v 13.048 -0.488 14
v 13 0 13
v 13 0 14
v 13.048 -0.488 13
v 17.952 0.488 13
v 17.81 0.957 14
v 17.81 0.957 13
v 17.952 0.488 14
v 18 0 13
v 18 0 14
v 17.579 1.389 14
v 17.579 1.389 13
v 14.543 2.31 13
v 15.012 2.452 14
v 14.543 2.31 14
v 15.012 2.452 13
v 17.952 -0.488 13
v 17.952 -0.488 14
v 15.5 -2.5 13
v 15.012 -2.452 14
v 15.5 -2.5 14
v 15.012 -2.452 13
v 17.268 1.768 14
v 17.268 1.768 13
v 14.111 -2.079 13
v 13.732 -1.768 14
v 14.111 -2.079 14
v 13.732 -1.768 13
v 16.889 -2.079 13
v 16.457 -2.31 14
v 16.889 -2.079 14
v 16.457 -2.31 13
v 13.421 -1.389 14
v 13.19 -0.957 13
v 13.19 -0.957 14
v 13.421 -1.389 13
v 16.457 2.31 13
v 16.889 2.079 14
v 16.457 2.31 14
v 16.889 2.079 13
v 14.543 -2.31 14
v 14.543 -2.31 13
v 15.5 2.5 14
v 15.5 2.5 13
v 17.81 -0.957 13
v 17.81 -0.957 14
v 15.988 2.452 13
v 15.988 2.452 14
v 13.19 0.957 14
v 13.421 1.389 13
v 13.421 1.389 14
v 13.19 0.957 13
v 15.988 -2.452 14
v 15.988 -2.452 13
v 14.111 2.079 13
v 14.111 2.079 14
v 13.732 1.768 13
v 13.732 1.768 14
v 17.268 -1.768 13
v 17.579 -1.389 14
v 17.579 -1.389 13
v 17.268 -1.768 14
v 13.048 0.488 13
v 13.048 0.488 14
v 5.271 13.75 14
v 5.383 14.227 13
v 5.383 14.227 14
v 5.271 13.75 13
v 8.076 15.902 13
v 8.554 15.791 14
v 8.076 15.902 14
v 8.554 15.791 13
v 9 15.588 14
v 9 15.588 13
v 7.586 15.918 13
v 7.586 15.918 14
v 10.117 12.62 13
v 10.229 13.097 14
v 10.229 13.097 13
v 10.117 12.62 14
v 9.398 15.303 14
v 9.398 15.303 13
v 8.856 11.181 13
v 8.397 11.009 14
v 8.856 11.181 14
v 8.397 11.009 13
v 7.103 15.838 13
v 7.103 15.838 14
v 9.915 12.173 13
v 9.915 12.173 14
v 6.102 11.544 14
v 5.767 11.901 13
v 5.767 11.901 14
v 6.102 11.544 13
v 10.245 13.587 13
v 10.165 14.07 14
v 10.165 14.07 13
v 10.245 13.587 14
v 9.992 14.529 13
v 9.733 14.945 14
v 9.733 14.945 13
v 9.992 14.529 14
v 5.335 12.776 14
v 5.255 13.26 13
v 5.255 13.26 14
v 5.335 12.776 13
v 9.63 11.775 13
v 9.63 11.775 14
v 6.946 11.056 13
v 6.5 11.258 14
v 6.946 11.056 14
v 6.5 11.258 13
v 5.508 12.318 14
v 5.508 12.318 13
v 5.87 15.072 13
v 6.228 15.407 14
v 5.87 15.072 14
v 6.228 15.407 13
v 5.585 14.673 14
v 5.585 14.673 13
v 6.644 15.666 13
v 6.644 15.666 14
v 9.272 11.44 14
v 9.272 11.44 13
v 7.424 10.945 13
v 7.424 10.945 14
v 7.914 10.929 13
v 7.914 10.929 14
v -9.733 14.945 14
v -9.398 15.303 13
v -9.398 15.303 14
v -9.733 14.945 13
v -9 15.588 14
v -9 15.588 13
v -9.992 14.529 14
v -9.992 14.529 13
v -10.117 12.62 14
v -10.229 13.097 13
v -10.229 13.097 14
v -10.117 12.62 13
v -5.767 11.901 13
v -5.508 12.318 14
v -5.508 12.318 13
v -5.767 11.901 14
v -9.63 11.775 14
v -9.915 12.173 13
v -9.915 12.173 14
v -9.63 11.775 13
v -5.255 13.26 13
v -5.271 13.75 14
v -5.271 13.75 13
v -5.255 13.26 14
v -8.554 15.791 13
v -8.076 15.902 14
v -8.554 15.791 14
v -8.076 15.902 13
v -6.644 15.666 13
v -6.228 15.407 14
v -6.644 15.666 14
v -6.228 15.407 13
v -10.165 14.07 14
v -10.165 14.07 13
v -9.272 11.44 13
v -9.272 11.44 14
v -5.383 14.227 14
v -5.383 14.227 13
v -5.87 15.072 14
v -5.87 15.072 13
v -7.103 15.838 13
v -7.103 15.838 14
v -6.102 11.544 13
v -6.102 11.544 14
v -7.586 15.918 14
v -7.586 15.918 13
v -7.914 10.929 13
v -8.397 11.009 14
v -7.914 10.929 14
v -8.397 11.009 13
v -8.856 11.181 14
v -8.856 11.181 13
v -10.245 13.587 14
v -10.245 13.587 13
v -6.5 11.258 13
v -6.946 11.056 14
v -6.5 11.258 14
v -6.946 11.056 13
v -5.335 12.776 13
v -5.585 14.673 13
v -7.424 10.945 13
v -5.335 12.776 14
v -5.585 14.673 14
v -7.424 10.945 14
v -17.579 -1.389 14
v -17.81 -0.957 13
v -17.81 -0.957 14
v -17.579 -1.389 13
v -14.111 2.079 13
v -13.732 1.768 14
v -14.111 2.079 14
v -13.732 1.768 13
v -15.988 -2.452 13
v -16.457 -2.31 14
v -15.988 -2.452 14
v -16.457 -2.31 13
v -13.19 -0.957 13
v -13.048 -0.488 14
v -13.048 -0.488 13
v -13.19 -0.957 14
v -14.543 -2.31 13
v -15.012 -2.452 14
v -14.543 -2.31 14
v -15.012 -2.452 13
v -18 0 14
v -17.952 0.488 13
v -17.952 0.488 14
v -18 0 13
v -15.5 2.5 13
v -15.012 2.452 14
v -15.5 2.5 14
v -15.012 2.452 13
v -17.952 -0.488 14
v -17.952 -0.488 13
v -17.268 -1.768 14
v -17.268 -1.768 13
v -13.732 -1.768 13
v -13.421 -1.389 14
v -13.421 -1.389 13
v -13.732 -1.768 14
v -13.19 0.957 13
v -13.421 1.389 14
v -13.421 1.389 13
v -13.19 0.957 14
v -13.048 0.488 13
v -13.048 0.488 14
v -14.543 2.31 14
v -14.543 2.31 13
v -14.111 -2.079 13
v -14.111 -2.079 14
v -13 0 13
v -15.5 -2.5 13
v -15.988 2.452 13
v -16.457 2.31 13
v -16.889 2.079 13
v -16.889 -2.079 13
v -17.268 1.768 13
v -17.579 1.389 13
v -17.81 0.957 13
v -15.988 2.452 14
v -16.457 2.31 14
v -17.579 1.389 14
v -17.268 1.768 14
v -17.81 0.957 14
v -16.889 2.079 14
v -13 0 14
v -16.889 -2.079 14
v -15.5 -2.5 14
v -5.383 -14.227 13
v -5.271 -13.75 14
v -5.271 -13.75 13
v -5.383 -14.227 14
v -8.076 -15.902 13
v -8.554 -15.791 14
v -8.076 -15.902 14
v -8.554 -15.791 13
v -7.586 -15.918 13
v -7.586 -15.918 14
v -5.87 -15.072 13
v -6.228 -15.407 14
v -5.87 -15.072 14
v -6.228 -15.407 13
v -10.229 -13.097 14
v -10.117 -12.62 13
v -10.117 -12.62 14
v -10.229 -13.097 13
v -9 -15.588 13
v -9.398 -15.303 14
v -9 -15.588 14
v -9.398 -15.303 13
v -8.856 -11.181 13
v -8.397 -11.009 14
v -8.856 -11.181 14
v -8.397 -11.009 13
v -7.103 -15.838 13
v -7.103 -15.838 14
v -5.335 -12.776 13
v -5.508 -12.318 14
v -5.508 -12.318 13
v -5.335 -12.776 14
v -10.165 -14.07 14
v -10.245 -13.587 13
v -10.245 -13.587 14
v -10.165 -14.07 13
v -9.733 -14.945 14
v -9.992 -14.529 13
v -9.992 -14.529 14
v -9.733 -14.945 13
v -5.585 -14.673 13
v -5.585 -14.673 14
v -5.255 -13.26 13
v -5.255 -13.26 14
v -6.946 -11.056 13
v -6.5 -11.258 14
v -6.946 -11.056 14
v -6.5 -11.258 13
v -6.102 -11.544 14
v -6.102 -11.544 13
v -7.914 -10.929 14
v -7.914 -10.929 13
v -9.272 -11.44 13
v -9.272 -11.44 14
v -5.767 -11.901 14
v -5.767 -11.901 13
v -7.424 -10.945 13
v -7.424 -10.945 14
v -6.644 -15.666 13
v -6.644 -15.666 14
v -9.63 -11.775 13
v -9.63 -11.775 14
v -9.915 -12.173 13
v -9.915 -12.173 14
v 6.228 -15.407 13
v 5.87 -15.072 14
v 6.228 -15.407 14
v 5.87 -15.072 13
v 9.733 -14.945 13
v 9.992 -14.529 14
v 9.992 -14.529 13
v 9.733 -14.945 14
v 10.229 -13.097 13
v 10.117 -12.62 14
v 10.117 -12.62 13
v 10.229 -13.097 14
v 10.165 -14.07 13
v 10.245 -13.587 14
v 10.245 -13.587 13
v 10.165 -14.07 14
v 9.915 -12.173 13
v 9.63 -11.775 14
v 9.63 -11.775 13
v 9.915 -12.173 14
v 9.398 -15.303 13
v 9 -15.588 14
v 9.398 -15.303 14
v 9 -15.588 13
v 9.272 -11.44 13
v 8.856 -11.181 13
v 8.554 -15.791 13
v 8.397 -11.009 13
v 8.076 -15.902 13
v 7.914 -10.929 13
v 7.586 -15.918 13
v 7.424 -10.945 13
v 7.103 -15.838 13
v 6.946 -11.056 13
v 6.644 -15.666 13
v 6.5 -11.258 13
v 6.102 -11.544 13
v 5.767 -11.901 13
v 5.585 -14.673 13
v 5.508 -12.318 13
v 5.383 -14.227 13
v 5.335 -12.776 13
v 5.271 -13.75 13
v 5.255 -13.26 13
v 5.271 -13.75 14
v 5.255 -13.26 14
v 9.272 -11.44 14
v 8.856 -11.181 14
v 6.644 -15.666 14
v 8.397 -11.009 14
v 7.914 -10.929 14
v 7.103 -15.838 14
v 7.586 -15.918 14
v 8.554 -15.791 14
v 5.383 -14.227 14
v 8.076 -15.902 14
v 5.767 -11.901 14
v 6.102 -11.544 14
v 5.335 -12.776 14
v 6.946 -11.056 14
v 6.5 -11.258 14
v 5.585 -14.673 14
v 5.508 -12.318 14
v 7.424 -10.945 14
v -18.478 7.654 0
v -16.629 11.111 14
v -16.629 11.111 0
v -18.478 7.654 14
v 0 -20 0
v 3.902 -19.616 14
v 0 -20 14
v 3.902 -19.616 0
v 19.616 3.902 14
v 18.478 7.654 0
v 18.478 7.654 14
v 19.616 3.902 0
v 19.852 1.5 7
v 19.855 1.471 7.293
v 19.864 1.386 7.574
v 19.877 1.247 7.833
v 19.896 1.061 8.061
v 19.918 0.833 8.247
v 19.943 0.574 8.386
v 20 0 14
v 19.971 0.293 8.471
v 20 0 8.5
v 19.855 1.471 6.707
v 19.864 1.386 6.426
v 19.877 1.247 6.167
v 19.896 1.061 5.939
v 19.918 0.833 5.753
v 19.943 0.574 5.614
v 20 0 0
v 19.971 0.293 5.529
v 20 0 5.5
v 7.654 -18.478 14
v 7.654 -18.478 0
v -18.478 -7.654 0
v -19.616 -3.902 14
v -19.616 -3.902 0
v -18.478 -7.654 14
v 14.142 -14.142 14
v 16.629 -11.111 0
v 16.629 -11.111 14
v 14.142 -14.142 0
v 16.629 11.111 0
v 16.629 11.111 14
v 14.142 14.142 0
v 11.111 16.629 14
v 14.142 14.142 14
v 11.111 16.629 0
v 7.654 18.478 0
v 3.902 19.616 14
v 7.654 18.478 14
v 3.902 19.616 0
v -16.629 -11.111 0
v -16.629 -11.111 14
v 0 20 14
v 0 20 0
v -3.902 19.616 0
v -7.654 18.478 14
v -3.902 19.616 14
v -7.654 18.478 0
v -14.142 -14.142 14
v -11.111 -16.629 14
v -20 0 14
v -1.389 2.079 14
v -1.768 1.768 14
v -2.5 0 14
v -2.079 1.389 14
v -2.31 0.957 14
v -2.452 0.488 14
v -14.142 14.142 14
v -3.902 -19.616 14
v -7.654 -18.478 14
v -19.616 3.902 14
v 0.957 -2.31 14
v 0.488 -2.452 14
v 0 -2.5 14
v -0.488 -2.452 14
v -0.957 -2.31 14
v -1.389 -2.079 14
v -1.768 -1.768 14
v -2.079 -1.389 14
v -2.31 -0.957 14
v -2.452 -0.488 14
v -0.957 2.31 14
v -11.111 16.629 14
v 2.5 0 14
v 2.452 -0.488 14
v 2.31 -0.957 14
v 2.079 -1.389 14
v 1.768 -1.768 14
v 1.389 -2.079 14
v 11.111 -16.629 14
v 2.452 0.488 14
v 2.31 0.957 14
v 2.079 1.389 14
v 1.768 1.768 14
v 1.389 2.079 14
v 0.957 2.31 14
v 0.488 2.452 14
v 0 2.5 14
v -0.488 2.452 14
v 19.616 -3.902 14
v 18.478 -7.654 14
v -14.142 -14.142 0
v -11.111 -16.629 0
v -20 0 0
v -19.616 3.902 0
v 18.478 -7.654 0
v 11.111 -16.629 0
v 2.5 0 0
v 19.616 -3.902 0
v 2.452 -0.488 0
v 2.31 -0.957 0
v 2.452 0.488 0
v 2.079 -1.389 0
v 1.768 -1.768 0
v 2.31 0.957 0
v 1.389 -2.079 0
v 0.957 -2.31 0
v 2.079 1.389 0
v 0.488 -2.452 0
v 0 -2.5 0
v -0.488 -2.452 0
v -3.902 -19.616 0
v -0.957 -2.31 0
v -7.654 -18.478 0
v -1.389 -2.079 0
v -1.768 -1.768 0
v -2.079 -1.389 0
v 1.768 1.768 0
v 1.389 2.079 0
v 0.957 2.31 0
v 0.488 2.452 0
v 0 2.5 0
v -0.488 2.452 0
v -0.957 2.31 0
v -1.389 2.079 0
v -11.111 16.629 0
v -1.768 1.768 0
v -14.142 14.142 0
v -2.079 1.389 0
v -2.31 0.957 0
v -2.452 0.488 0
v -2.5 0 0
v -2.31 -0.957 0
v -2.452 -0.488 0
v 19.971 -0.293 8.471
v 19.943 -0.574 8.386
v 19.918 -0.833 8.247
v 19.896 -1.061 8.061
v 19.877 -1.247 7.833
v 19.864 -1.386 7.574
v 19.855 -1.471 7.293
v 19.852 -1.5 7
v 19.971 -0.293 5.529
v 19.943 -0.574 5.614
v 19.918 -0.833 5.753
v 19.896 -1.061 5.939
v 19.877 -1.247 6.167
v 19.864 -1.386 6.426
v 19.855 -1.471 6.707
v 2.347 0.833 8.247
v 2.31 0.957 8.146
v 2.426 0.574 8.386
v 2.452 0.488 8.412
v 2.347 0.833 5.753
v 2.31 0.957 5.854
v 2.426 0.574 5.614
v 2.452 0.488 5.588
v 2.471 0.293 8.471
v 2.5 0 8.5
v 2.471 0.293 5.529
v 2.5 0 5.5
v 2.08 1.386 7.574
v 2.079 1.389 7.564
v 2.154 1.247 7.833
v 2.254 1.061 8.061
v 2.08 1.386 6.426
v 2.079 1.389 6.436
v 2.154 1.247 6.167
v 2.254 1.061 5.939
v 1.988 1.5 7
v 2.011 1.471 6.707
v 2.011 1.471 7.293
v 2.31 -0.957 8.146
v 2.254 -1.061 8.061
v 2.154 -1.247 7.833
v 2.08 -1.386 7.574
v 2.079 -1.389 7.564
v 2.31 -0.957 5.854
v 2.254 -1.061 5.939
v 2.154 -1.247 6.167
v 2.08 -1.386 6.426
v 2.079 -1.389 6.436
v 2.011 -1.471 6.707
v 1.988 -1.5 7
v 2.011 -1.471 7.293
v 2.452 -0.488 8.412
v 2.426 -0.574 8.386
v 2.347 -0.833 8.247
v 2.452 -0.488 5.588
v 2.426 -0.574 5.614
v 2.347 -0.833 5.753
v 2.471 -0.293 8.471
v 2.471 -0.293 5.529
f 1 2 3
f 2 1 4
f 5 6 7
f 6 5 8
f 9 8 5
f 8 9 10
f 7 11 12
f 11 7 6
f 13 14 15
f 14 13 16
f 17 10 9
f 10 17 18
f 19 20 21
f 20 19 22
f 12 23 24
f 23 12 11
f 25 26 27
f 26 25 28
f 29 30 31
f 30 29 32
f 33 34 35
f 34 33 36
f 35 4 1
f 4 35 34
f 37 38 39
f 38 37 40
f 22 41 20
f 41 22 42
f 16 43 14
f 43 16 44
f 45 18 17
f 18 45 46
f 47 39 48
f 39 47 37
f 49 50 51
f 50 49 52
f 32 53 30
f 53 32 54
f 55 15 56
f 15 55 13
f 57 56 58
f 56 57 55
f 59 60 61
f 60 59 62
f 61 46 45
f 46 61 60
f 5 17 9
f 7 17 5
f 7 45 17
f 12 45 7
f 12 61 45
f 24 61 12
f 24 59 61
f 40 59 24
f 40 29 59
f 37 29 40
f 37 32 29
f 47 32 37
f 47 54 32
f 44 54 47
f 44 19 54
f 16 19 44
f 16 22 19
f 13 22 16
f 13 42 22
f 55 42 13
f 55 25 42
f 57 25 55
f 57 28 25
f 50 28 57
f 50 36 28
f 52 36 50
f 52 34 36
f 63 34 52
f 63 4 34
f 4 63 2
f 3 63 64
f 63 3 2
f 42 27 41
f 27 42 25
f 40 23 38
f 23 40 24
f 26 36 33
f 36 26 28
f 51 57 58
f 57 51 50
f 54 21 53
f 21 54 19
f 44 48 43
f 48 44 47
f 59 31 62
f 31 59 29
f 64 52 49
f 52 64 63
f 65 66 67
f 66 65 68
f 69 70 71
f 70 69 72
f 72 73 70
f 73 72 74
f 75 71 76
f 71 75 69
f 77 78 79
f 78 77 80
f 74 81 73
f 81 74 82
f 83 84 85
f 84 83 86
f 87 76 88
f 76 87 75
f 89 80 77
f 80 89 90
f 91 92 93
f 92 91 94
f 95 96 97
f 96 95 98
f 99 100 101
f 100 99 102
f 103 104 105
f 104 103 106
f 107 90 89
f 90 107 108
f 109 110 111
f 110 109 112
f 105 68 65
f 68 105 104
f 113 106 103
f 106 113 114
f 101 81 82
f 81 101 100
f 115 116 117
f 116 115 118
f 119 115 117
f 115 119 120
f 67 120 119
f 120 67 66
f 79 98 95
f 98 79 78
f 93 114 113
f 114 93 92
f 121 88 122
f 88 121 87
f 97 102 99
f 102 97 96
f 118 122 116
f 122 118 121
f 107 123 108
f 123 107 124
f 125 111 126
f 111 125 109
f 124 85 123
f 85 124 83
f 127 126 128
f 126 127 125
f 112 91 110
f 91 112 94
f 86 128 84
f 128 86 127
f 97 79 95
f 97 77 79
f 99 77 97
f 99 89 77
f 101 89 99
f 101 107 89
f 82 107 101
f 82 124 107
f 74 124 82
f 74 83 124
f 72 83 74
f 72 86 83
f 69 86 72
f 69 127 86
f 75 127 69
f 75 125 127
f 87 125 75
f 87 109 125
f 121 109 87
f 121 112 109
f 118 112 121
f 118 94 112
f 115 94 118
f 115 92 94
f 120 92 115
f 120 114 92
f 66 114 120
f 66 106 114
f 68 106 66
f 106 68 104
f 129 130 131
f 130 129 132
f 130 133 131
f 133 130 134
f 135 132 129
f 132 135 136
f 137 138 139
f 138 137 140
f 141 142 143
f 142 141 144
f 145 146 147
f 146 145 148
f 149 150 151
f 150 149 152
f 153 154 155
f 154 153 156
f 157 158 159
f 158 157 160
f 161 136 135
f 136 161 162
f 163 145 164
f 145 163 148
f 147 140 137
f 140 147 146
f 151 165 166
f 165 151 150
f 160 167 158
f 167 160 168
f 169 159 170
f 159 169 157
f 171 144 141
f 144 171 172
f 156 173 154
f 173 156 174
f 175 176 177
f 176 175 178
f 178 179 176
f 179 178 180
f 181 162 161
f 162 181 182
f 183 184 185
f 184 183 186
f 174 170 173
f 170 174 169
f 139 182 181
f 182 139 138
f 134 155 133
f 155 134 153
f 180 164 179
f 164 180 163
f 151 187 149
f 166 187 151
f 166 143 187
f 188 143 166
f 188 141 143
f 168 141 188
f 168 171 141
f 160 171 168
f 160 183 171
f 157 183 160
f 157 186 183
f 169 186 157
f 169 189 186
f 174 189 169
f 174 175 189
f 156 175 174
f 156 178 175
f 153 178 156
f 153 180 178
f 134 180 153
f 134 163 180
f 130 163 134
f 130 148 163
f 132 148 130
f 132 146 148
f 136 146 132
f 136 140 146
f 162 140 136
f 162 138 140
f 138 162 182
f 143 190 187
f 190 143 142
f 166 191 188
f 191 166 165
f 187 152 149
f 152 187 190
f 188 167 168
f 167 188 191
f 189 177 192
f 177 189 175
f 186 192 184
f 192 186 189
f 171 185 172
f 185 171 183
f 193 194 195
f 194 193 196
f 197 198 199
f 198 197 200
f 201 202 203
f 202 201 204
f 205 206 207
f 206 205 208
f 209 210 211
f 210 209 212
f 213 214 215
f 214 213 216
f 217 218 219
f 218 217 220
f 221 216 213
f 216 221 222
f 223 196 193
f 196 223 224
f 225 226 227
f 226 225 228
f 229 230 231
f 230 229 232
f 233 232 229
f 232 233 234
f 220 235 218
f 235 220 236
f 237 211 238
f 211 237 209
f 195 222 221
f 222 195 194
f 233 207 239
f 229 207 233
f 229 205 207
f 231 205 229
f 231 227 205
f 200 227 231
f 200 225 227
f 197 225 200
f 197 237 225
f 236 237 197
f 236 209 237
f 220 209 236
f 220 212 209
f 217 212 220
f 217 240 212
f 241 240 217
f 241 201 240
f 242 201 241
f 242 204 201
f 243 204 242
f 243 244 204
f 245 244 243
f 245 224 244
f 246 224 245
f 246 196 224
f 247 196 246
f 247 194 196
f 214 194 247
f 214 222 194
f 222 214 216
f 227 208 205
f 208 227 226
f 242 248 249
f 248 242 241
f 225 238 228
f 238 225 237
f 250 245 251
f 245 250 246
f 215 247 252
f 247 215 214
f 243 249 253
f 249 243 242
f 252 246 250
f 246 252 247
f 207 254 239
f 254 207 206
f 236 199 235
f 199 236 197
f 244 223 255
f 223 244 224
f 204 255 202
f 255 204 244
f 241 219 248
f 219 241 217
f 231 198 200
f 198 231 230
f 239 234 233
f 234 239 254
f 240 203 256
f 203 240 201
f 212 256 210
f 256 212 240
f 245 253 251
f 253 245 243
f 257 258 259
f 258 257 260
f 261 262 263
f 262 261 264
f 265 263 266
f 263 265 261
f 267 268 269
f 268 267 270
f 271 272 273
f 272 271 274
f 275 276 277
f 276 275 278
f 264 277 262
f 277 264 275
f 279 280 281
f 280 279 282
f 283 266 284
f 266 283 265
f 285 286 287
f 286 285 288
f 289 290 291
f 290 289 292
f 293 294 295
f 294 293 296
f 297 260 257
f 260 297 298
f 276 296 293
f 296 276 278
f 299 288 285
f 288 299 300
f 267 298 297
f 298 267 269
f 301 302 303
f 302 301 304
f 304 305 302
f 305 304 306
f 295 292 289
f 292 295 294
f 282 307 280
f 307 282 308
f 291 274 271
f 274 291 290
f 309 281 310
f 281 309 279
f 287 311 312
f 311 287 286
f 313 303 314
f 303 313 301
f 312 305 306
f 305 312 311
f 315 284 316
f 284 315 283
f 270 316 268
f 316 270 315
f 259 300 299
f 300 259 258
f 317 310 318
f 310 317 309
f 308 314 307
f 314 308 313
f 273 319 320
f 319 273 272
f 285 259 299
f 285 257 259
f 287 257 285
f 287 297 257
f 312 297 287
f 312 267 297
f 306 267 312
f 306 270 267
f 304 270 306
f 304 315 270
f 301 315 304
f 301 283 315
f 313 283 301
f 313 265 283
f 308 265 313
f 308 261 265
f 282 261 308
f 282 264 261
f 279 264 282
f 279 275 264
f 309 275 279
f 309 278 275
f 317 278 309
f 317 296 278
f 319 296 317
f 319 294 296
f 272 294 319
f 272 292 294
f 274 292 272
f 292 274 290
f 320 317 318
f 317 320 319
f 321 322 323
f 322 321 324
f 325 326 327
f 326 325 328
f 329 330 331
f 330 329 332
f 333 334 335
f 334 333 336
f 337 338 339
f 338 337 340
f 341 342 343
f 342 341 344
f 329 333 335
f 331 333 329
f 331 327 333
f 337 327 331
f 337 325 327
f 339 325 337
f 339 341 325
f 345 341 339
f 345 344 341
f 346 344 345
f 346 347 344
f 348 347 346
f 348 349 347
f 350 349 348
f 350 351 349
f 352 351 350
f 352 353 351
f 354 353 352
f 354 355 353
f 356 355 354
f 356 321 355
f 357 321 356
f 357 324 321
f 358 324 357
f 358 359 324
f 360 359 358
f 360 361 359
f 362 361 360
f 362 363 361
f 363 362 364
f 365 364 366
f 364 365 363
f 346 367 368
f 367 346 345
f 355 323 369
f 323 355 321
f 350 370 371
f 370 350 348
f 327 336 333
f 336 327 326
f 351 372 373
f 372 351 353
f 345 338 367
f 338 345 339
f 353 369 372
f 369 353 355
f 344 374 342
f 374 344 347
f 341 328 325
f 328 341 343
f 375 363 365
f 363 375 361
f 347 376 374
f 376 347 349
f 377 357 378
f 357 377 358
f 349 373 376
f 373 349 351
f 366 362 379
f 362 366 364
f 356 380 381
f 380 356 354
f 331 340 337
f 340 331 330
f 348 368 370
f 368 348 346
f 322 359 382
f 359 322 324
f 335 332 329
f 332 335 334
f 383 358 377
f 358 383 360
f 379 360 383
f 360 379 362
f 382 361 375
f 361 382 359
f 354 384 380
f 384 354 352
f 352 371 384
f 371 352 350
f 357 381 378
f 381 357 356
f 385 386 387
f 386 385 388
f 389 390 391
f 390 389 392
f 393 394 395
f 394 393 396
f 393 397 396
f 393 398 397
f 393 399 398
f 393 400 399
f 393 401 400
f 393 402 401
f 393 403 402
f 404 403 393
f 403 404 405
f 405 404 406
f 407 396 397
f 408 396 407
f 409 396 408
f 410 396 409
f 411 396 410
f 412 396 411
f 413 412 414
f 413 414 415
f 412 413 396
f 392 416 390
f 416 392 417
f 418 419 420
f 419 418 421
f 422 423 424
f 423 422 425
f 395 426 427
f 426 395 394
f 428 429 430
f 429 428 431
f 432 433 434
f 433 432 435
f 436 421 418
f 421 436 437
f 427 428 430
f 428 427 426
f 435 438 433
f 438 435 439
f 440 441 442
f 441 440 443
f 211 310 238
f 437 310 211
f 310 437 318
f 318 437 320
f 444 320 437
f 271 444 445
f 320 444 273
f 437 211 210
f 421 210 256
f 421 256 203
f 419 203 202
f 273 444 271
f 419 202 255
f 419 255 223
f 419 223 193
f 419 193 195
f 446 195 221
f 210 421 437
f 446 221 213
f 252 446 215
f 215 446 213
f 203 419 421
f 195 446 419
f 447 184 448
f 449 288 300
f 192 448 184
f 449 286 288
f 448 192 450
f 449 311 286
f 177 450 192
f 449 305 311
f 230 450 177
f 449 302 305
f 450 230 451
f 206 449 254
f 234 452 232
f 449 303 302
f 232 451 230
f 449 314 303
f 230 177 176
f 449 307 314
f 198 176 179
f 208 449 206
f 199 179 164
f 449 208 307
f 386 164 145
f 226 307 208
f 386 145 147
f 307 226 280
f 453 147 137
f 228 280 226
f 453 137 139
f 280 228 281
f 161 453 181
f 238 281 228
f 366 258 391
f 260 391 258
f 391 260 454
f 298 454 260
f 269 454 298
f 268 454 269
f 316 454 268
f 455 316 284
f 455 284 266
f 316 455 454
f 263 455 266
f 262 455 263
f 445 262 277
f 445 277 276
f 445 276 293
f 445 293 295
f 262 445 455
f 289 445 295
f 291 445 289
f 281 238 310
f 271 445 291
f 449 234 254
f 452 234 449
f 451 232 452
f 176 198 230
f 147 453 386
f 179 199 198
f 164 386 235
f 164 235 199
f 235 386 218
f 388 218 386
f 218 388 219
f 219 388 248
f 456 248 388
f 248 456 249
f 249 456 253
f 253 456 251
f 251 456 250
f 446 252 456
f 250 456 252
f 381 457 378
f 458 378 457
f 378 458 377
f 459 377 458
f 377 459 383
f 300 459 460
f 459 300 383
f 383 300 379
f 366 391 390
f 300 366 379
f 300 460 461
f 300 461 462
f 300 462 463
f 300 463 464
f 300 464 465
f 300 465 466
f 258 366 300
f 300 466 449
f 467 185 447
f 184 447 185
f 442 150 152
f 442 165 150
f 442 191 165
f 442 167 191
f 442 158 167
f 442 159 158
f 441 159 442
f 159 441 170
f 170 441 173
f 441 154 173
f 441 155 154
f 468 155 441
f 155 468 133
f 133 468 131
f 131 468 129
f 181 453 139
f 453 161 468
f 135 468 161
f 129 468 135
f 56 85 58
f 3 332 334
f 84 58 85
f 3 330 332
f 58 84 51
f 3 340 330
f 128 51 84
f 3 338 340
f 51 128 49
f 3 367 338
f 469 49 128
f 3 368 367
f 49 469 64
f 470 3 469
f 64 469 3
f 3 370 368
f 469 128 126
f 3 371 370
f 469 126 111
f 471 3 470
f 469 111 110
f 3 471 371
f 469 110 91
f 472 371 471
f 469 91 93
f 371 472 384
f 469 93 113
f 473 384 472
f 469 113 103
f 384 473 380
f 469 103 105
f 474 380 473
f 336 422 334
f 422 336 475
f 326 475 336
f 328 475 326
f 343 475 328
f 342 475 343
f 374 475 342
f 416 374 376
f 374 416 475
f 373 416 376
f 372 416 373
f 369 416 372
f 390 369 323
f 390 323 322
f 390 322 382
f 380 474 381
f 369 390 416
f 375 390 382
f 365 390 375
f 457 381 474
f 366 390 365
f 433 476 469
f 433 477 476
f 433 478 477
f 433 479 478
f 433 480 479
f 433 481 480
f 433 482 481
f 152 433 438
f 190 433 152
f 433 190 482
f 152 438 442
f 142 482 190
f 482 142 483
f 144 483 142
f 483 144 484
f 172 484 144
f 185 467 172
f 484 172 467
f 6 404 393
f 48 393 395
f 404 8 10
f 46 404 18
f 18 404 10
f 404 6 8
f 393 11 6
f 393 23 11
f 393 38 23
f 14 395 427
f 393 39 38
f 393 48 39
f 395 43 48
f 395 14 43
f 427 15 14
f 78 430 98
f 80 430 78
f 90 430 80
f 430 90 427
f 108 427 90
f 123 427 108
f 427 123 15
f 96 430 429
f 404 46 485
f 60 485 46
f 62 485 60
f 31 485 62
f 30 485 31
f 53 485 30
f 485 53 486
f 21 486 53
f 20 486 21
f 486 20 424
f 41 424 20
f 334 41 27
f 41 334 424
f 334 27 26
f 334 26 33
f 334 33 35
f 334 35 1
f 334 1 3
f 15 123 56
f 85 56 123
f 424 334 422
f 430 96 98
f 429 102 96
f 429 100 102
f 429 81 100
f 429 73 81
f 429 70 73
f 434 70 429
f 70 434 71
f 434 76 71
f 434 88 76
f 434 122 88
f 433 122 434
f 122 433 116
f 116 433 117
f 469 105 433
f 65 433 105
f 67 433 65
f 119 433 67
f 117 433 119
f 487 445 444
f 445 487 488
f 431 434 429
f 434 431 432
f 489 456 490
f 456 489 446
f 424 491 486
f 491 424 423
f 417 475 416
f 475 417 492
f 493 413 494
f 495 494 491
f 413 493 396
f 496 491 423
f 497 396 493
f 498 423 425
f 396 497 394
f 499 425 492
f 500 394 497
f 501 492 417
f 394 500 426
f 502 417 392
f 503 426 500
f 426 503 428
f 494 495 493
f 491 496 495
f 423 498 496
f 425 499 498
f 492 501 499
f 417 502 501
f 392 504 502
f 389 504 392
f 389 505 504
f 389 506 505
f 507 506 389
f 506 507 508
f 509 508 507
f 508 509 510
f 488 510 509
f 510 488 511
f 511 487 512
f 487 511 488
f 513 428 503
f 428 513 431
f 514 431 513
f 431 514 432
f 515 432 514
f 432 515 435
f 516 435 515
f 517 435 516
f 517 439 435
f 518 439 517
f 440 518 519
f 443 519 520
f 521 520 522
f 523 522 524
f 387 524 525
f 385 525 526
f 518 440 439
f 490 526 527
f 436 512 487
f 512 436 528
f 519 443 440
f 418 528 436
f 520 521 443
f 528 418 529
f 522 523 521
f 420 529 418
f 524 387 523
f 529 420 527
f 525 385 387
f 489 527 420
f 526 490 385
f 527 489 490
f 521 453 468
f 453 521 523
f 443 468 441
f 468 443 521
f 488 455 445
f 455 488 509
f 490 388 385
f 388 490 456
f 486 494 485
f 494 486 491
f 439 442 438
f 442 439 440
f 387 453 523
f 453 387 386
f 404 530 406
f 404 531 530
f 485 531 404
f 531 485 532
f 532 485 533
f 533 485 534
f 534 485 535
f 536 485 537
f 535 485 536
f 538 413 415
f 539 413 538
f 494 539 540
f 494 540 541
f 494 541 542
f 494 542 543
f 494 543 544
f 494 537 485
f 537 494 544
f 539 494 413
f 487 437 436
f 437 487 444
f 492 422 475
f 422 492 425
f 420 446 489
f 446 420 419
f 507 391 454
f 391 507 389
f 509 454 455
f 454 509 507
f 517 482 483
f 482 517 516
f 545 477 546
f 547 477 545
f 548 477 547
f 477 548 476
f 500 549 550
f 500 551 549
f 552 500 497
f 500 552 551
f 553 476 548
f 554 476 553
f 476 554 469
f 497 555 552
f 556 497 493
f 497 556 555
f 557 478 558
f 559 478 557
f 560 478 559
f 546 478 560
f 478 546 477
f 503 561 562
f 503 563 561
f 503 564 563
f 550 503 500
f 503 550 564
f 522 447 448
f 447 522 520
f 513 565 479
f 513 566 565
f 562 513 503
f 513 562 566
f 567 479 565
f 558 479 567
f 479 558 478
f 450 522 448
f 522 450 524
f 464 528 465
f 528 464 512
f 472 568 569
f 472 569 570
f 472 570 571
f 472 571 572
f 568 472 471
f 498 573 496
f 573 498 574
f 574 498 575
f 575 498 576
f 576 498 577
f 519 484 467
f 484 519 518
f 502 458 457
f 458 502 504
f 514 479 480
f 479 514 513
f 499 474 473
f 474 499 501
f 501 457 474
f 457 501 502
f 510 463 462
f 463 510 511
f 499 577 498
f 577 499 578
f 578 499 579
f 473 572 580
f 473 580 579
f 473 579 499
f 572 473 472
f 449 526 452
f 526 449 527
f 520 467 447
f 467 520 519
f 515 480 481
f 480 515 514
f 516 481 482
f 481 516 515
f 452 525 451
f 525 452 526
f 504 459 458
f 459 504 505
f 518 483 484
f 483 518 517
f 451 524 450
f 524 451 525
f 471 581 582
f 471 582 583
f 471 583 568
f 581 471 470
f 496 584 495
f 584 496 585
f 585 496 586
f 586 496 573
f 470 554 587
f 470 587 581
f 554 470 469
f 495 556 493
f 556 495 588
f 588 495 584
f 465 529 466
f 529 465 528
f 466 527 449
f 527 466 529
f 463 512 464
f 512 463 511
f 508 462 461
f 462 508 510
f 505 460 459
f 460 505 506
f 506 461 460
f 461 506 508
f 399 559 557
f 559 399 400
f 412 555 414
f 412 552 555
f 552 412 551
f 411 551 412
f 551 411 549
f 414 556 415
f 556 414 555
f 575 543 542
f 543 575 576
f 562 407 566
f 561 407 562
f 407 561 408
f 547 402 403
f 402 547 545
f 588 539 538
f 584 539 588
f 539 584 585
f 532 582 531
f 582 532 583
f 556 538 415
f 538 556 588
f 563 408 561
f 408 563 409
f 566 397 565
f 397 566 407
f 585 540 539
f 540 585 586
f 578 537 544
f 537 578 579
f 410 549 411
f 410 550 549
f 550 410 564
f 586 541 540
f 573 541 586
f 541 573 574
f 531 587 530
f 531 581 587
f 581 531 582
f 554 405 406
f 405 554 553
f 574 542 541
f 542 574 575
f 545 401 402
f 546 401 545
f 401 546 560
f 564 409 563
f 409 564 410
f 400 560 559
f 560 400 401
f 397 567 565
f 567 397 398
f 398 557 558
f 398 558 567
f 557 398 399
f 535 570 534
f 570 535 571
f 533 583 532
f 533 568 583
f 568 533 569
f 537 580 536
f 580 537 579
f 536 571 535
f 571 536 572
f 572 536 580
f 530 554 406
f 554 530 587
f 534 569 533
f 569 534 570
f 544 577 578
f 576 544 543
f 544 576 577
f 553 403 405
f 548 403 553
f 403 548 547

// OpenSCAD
$fn = 32;

// ----------------------------------------------------------------------
// Control knob: dimpled knob
// ----------------------------------------------------------------------

// --- parameters (mm) ---
dimp_d = 5;               // finger dimple diameter
n_dimp = 6;               // number of dimples
dimp_r = 15.5;            // dimple ring radius
knob_d = 40;              // knob body diameter
knob_h = 14;              // knob body height
bore_d = 5;               // shaft bore diameter
set_d = 3;                // set screw bore diameter

dimp_step = 360 / n_dimp;  // dimple angular step

difference() {
  cylinder(h = knob_h, d = knob_d);
  translate([0, 0, -1]) cylinder(h = knob_h + 2, d = bore_d);
  translate([-1, 0, knob_h / 2]) rotate([0, 90, 0])
    cylinder(h = knob_d / 2 + bore_d / 2 + 2, d = set_d);  for (i = [0 : n_dimp - 1])
    rotate([0, 0, i * dimp_step])
      translate([dimp_r, 0, knob_h - 1])
        cylinder(h = 2, d = dimp_d);
}
